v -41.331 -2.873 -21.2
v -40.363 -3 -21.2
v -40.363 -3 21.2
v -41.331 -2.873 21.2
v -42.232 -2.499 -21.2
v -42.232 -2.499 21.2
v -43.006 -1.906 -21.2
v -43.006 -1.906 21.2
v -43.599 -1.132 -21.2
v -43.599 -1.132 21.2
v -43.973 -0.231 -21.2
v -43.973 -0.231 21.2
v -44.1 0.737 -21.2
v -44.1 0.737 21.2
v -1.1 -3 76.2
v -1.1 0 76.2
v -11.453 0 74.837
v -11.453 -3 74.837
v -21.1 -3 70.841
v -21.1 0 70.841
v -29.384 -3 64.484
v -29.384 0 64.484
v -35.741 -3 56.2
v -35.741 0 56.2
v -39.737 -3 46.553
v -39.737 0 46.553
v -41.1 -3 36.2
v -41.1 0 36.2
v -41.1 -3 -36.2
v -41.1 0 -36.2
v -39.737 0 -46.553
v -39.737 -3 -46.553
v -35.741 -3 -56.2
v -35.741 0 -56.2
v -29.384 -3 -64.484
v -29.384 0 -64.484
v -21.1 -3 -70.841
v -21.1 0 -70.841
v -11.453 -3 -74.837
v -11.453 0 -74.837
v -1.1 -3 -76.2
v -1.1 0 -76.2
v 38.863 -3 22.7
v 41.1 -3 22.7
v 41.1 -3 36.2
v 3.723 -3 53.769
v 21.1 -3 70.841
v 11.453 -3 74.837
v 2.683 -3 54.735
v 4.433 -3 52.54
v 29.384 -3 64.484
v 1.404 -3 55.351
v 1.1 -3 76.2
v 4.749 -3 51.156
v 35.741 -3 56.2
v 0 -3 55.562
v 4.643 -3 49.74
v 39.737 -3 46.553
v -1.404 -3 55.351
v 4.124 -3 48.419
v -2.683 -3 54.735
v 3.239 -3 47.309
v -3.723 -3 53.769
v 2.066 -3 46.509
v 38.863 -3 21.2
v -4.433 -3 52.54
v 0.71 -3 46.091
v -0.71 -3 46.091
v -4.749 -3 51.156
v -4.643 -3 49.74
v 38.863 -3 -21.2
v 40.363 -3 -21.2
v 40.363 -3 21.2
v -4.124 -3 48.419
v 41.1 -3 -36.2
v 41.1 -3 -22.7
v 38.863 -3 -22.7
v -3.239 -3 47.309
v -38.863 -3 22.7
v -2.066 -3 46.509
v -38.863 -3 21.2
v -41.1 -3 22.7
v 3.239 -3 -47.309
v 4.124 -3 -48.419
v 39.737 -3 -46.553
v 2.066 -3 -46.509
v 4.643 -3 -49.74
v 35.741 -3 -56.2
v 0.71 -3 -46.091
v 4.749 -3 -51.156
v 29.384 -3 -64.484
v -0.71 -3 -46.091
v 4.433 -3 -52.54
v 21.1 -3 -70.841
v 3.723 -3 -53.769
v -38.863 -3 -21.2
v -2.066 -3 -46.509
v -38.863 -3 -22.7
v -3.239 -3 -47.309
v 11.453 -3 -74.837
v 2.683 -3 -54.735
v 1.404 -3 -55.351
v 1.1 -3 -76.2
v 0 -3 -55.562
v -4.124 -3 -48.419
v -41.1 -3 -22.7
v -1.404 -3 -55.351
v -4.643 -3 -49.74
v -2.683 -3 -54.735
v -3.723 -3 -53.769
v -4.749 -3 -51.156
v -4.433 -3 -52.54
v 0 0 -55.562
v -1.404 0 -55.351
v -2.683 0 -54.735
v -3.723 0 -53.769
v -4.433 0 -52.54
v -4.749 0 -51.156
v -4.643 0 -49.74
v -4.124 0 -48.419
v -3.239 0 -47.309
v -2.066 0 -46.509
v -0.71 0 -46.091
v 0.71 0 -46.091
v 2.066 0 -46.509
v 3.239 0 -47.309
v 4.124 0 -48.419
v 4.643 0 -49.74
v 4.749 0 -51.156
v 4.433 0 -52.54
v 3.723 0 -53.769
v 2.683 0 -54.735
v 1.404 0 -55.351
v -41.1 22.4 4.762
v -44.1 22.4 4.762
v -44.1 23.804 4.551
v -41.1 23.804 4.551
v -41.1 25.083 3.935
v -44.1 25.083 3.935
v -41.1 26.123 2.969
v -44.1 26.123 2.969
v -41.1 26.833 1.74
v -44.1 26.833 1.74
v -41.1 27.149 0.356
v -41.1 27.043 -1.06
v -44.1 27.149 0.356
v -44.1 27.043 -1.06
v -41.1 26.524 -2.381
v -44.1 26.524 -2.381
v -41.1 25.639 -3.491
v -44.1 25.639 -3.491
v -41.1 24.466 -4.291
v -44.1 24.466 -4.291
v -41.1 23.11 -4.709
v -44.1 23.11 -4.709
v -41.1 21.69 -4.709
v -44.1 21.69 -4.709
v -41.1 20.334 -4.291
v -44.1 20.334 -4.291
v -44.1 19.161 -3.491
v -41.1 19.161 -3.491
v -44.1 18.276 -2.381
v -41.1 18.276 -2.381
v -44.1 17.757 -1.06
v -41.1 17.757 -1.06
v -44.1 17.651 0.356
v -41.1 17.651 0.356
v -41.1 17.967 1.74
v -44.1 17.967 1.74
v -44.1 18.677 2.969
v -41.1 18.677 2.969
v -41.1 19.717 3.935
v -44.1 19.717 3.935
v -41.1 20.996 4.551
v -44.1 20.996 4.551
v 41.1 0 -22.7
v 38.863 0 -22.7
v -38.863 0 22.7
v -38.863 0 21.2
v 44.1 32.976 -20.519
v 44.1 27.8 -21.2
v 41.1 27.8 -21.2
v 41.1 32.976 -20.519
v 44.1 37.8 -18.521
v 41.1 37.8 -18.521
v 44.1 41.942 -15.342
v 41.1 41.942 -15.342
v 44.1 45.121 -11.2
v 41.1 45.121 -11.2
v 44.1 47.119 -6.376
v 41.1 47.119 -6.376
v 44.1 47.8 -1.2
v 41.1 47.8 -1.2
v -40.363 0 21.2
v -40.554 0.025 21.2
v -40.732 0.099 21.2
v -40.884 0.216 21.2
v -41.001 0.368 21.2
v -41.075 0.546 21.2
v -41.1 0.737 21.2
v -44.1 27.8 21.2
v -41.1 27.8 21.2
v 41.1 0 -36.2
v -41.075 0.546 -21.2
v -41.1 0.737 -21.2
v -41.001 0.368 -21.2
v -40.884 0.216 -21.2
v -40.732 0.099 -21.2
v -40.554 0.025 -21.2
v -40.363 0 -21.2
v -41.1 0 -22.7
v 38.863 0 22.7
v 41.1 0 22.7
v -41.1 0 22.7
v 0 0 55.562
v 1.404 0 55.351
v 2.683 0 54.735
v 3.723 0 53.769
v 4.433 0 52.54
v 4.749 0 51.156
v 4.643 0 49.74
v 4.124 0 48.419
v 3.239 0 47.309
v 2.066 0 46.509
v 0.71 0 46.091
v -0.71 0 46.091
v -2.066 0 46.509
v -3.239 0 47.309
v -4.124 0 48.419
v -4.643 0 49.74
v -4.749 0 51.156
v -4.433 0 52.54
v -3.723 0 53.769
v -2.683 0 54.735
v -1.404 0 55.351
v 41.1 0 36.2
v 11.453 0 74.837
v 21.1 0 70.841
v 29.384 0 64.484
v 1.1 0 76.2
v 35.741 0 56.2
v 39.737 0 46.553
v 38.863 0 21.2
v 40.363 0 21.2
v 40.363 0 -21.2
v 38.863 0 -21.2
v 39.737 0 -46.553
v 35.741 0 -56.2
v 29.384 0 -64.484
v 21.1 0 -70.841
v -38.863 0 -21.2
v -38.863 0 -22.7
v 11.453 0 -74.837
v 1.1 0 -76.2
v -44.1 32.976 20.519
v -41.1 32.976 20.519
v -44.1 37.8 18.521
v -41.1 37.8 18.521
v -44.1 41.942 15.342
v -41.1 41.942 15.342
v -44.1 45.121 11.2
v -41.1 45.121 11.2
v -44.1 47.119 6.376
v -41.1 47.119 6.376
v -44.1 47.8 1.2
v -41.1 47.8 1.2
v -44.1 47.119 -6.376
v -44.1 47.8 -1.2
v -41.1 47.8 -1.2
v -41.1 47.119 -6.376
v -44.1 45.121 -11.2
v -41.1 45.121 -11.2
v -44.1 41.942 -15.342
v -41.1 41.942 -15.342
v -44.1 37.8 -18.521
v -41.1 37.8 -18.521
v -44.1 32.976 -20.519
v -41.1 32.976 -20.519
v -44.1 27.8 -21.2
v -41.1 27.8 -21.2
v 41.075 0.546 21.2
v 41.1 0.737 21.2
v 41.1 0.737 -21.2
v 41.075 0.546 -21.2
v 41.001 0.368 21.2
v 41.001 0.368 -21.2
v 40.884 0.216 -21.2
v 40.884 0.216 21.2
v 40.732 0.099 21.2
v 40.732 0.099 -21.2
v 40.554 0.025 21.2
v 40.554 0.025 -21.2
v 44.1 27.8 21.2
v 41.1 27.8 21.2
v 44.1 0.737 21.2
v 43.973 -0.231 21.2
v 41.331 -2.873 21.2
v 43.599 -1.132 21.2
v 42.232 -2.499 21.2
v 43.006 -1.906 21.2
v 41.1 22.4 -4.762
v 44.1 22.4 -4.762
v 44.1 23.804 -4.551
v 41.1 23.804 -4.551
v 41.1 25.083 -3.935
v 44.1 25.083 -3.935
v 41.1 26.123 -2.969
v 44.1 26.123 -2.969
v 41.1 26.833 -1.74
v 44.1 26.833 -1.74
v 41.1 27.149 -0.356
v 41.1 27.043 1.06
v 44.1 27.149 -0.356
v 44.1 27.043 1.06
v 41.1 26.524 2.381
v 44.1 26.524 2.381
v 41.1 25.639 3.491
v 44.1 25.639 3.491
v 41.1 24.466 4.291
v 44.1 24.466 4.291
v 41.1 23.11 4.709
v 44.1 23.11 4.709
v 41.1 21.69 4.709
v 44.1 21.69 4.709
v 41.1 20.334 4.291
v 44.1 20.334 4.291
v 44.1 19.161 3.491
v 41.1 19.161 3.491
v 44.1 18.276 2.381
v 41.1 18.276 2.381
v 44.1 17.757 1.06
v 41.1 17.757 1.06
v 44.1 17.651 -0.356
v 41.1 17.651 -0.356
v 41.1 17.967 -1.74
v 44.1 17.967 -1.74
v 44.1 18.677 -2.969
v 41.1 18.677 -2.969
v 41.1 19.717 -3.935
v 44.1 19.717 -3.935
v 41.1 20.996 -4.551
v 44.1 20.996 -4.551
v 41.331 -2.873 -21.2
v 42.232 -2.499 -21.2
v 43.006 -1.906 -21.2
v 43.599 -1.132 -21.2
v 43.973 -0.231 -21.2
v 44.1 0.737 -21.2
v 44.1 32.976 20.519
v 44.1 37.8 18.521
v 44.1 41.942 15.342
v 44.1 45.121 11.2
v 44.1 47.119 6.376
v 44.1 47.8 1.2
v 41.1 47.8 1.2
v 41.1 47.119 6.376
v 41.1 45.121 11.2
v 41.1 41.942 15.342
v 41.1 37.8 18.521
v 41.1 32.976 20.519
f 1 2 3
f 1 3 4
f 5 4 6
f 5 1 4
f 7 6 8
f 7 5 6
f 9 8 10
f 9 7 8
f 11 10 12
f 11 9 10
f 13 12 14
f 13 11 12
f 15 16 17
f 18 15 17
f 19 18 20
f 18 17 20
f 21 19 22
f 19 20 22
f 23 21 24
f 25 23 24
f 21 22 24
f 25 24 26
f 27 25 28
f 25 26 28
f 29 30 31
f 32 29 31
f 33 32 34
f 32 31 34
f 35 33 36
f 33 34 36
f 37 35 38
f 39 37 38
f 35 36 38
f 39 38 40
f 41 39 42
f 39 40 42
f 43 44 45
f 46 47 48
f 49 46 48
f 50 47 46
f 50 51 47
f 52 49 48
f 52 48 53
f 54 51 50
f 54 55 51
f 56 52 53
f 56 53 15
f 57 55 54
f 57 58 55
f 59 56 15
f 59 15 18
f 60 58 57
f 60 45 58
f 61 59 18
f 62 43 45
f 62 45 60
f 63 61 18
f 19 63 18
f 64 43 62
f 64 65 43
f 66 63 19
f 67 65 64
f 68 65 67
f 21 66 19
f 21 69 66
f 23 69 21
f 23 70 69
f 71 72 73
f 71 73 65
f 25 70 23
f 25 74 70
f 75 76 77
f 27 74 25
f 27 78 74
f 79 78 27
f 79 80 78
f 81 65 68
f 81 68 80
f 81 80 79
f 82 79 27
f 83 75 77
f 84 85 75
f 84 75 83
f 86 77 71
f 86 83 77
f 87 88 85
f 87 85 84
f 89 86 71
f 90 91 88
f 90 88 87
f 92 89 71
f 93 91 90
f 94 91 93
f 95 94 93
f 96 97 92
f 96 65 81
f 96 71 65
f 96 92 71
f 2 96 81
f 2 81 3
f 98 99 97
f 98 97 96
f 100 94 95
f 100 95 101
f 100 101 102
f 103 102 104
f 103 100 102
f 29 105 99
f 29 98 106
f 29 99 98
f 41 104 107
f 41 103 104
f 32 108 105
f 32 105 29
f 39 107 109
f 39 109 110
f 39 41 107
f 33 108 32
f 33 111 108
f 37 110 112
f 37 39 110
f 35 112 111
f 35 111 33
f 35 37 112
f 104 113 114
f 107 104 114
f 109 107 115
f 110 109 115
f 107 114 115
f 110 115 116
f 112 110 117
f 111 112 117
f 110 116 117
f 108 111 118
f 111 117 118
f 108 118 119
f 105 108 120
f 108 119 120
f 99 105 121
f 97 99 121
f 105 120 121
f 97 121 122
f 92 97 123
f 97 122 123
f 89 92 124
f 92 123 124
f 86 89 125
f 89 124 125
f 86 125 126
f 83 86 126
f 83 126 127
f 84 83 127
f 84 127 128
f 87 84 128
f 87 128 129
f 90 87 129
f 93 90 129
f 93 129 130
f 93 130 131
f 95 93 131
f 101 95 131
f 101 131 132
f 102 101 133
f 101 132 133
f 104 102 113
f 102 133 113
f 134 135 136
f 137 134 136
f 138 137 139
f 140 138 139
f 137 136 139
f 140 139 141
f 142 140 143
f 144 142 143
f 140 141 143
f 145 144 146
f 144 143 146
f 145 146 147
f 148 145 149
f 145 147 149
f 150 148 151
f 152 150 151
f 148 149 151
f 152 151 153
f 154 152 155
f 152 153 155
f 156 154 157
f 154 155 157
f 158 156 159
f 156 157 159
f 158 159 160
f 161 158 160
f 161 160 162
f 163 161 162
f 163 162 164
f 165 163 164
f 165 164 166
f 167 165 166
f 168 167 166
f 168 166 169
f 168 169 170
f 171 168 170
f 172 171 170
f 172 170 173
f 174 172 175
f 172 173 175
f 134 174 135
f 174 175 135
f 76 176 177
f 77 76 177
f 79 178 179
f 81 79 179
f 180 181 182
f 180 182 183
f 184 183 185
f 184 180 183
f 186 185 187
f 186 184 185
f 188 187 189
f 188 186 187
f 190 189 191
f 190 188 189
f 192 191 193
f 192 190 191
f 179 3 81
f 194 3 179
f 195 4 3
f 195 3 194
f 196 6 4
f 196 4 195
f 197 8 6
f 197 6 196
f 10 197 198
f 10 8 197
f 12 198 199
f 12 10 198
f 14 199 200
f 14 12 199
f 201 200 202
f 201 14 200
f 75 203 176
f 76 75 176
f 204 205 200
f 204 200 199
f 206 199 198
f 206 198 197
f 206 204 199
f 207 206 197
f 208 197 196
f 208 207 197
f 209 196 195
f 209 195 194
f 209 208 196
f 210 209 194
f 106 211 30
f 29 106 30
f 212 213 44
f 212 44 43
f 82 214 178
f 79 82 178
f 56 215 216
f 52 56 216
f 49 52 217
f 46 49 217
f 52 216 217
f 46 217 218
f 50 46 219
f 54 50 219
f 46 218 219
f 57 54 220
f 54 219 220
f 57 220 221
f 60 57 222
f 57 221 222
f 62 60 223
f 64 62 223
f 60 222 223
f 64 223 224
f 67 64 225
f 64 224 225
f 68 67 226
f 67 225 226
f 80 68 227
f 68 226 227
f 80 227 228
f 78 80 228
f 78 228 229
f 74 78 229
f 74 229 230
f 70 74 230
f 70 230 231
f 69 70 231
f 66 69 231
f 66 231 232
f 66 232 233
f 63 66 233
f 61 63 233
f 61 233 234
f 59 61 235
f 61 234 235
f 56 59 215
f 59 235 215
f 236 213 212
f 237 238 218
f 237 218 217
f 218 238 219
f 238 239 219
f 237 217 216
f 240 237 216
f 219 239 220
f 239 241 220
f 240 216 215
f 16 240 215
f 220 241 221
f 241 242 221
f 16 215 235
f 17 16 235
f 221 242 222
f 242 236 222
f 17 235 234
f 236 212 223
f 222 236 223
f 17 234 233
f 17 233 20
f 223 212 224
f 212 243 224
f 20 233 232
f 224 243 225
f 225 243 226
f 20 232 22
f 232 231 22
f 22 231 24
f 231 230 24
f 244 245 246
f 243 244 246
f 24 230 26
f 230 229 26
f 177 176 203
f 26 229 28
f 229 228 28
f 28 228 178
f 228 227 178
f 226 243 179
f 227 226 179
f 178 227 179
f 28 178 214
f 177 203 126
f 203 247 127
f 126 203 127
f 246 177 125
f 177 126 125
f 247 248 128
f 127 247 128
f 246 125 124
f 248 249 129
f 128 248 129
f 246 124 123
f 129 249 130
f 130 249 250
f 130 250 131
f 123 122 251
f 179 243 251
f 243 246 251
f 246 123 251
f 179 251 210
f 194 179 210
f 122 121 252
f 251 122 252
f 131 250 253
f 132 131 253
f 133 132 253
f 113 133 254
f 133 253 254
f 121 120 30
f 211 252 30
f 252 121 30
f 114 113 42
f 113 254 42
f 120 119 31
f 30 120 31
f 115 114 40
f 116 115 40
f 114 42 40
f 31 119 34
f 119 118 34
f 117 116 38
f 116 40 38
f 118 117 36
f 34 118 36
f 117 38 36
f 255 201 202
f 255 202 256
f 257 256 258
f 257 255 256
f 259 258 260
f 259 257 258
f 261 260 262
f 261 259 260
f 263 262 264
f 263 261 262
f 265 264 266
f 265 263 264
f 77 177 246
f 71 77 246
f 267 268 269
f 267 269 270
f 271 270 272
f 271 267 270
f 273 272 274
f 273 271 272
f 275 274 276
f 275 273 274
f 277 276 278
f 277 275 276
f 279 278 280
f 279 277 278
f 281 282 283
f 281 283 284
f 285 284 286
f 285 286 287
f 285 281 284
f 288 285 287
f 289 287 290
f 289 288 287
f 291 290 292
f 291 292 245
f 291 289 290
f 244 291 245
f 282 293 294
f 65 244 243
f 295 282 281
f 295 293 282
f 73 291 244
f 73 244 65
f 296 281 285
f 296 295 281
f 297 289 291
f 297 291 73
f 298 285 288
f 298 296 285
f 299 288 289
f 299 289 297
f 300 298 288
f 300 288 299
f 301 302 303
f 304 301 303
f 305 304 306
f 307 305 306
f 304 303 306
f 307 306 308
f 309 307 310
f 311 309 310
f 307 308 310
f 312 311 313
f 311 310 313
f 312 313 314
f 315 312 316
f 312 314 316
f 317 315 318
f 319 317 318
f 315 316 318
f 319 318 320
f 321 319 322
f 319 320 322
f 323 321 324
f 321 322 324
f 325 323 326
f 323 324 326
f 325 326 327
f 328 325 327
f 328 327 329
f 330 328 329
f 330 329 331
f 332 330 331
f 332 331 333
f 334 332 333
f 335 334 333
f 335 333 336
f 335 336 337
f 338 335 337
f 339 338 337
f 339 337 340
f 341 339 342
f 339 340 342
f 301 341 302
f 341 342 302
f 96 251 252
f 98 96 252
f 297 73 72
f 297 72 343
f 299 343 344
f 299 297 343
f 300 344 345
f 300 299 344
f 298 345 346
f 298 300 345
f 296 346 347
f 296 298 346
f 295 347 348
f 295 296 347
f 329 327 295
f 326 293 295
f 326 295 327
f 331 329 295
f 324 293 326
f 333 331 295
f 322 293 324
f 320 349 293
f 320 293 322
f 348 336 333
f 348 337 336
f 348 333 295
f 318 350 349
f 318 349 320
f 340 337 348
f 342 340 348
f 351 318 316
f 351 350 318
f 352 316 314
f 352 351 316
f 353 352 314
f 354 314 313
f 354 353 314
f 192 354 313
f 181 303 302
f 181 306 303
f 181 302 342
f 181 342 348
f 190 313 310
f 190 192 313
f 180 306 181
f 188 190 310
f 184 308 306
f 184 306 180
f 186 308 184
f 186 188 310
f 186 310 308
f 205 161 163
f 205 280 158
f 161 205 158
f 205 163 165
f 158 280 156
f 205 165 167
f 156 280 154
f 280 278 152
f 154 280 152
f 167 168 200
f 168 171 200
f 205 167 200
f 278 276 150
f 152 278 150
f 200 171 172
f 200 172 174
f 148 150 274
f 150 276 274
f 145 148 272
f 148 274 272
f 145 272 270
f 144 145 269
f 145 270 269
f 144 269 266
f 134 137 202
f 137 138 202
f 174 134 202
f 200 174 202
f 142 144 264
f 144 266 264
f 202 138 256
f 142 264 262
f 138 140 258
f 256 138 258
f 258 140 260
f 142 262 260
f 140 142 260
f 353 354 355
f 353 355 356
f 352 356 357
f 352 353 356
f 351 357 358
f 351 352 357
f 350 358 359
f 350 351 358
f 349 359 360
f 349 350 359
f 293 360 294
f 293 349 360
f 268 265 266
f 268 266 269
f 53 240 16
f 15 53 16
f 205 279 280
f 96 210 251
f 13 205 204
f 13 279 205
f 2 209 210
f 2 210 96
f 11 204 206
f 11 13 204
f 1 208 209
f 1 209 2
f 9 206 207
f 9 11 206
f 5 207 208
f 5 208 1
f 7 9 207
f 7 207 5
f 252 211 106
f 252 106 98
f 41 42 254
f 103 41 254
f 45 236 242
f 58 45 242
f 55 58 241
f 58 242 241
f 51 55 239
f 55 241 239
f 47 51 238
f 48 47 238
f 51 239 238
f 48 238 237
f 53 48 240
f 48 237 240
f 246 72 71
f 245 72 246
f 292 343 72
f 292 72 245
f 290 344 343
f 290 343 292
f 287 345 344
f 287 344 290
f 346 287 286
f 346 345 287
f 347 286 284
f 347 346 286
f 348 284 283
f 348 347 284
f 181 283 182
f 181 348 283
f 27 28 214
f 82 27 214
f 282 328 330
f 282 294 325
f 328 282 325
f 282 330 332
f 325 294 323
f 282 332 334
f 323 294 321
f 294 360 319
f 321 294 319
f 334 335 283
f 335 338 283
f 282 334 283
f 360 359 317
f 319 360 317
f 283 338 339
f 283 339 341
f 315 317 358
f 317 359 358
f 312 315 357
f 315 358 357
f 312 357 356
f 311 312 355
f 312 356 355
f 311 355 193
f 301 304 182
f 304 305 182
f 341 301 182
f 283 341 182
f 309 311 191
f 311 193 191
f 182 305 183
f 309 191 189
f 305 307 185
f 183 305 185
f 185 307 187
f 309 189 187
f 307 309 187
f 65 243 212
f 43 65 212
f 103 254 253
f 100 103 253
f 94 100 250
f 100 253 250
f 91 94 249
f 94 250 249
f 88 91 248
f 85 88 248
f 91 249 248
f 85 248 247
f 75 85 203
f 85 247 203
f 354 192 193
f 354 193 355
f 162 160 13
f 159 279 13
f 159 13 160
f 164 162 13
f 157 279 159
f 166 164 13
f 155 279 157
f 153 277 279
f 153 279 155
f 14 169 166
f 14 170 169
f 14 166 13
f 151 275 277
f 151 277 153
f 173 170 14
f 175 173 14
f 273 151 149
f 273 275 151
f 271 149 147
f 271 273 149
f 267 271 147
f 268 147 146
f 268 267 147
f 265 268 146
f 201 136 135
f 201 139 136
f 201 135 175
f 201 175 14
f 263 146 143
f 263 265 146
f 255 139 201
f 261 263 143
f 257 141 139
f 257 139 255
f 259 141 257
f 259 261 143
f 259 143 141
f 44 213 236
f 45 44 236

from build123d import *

# Parameters (mm, degrees)
SKETCH1_R                     = 4.7625
BASE_FLANGE1_DEPTH            = 3
EDGE_FLANGE2_STRIP_W          = 13.4732
EDGE_FLANGE2_STRIP_H          = 3
EDGE_FLANGE2_STRIP_CUT_DEPTH  = 42.4
EDGE_FLANGE2_RELIEF_W         = 14.9732
EDGE_FLANGE2_RELIEF_H         = 1.5
EDGE_FLANGE2_RELIEF_CUT_DEPTH = 3
EDGE_FLANGE2_DEPTH            = 42.4
EDGE_FLANGE2_START            = 3
EDGE_FLANGE2_PROFILE_R        = 4.7625
EDGE_FLANGE2_FLAT_DEPTH       = 3
EDGE_FLANGE3_STRIP_W          = 13.4732
EDGE_FLANGE3_STRIP_H          = 3
EDGE_FLANGE3_STRIP_CUT_DEPTH  = 42.4
EDGE_FLANGE3_RELIEF_W         = 14.9732
EDGE_FLANGE3_RELIEF_H         = 1.5
EDGE_FLANGE3_RELIEF_CUT_DEPTH = 3
EDGE_FLANGE3_DEPTH            = 42.4
EDGE_FLANGE3_START            = 3
EDGE_FLANGE3_PROFILE_R        = 4.7625
EDGE_FLANGE3_FLAT_DEPTH       = 3


# Sheet-metal steps are written as plain solids
with BuildPart() as part:
    # Sketch1 → Base-Flange1 (new body)
    with BuildSketch(Plane(origin=(0, 0, 0), x_dir=(1, 0, 0), z_dir=(0, 1, 0))):
        with BuildLine():
            Line((-1.1, 76.2), (1.1, 76.2))
            ThreePointArc((1.1, 76.2), (29.384271247, 64.484271247), (41.1, 36.2))
            Line((41.1, 36.2), (41.1, -36.2))
            ThreePointArc((41.1, -36.2), (29.384271247, -64.484271247), (1.1, -76.2))
            Line((1.1, -76.2), (-1.1, -76.2))
            ThreePointArc((-1.1, -76.2), (-29.384271247, -64.484271247), (-41.1, -36.2))
            Line((-41.1, -36.2), (-41.1, 36.2))
            ThreePointArc((-41.1, 36.2), (-29.384271247, 64.484271247), (-1.1, 76.2))
        make_face()
        with Locations(Location((0, -50.8, 0), (0, 0, 270))):
            Circle(SKETCH1_R, mode=Mode.SUBTRACT)
        with Locations(Location((0, 50.8, 0), (0, 0, 90))):
            Circle(SKETCH1_R, mode=Mode.SUBTRACT)
    extrude(amount=-BASE_FLANGE1_DEPTH)

    # Edge-Flange2 strip (across the edge) → Edge-Flange2 strip cut (cut)
    with BuildSketch(Plane(origin=(41.1, 0, 21.2), x_dir=(-1, 0, 0), z_dir=(0, 0, -1))):
        with Locations((-6, -1.5)):
            Rectangle(EDGE_FLANGE2_STRIP_W, EDGE_FLANGE2_STRIP_H)
    extrude(amount=EDGE_FLANGE2_STRIP_CUT_DEPTH, mode=Mode.SUBTRACT)

    # Edge-Flange2 relief (on the sheet) → Edge-Flange2 relief cut (cut)
    with BuildSketch(Plane(origin=(40.3634, 0, 21.2), x_dir=(-1, 0, 0), z_dir=(0, 1, 0))):
        with Locations((-5.9866, 0.75)):
            Rectangle(EDGE_FLANGE2_RELIEF_W, EDGE_FLANGE2_RELIEF_H)
        with Locations((-5.9866, -43.15)):
            Rectangle(EDGE_FLANGE2_RELIEF_W, EDGE_FLANGE2_RELIEF_H)
    extrude(amount=-EDGE_FLANGE2_RELIEF_CUT_DEPTH, mode=Mode.SUBTRACT)

    # Edge-Flange2 bend section (across the edge) → Edge-Flange2 (add)
    with BuildSketch(Plane(origin=(41.1, 0, 21.2), x_dir=(-1, 0, 0), z_dir=(0, 0, -1))):
        with BuildLine():
            Line((-3, 0.7366), (0, 0.7366))
            ThreePointArc((0, 0.7366), (0.215745145, 0.215745145), (0.7366, 0))
            Line((0.7366, 0), (0.7366, -3))
            ThreePointArc((0.7366, -3), (-1.905575199, -1.905575199), (-3, 0.7366))
        make_face()
    extrude(amount=EDGE_FLANGE2_DEPTH)

    # Edge-Flange2 profile (on flange) → Edge-Flange2 flat (add)
    with BuildSketch(Plane(origin=(41.1, 0, 0), x_dir=(0, 0, -1), z_dir=(1, 0, 0)).offset(EDGE_FLANGE2_START)):
        with BuildLine():
            Line((-21.2, 27.8), (-21.2, 0.7366))
            Line((-21.2, 0.7366), (21.2, 0.7366))
            Line((21.2, 0.7366), (21.2, 27.8))
            ThreePointArc((21.2, 27.8), (15.342135624, 41.942135624), (1.2, 47.8))
            Line((1.2, 47.8), (-1.2, 47.8))
            ThreePointArc((-1.2, 47.8), (-15.342135624, 41.942135624), (-21.2, 27.8))
        make_face()
        with Locations((0, 22.4)):
            Circle(EDGE_FLANGE2_PROFILE_R, mode=Mode.SUBTRACT)
    extrude(amount=-EDGE_FLANGE2_FLAT_DEPTH)

    # Edge-Flange3 strip (across the edge) → Edge-Flange3 strip cut (cut)
    with BuildSketch(Plane(origin=(-41.1, 0, -21.2), x_dir=(1, 0, 0), z_dir=(0, 0, 1))):
        with Locations((-6, -1.5)):
            Rectangle(EDGE_FLANGE3_STRIP_W, EDGE_FLANGE3_STRIP_H)
    extrude(amount=EDGE_FLANGE3_STRIP_CUT_DEPTH, mode=Mode.SUBTRACT)

    # Edge-Flange3 relief (on the sheet) → Edge-Flange3 relief cut (cut)
    with BuildSketch(Plane(origin=(-40.3634, 0, -21.2), x_dir=(1, 0, 0), z_dir=(0, 1, 0))):
        with Locations((-5.9866, 0.75)):
            Rectangle(EDGE_FLANGE3_RELIEF_W, EDGE_FLANGE3_RELIEF_H)
        with Locations((-5.9866, -43.15)):
            Rectangle(EDGE_FLANGE3_RELIEF_W, EDGE_FLANGE3_RELIEF_H)
    extrude(amount=-EDGE_FLANGE3_RELIEF_CUT_DEPTH, mode=Mode.SUBTRACT)

    # Edge-Flange3 bend section (across the edge) → Edge-Flange3 (add)
    with BuildSketch(Plane(origin=(-41.1, 0, -21.2), x_dir=(1, 0, 0), z_dir=(0, 0, 1))):
        with BuildLine():
            Line((-3, 0.7366), (0, 0.7366))
            ThreePointArc((0, 0.7366), (0.215745145, 0.215745145), (0.7366, 0))
            Line((0.7366, 0), (0.7366, -3))
            ThreePointArc((0.7366, -3), (-1.905575199, -1.905575199), (-3, 0.7366))
        make_face()
    extrude(amount=EDGE_FLANGE3_DEPTH)

    # Edge-Flange3 profile (on flange) → Edge-Flange3 flat (add)
    with BuildSketch(Plane.ZY.offset(41.1).offset(EDGE_FLANGE3_START)):
        with BuildLine():
            Line((-21.2, 27.8), (-21.2, 0.7366))
            Line((-21.2, 0.7366), (21.2, 0.7366))
            Line((21.2, 0.7366), (21.2, 27.8))
            ThreePointArc((21.2, 27.8), (15.342135624, 41.942135624), (1.2, 47.8))
            Line((1.2, 47.8), (-1.2, 47.8))
            ThreePointArc((-1.2, 47.8), (-15.342135624, 41.942135624), (-21.2, 27.8))
        make_face()
        with Locations((0, 22.4)):
            Circle(EDGE_FLANGE3_PROFILE_R, mode=Mode.SUBTRACT)
    extrude(amount=-EDGE_FLANGE3_FLAT_DEPTH)


solid = part.part
